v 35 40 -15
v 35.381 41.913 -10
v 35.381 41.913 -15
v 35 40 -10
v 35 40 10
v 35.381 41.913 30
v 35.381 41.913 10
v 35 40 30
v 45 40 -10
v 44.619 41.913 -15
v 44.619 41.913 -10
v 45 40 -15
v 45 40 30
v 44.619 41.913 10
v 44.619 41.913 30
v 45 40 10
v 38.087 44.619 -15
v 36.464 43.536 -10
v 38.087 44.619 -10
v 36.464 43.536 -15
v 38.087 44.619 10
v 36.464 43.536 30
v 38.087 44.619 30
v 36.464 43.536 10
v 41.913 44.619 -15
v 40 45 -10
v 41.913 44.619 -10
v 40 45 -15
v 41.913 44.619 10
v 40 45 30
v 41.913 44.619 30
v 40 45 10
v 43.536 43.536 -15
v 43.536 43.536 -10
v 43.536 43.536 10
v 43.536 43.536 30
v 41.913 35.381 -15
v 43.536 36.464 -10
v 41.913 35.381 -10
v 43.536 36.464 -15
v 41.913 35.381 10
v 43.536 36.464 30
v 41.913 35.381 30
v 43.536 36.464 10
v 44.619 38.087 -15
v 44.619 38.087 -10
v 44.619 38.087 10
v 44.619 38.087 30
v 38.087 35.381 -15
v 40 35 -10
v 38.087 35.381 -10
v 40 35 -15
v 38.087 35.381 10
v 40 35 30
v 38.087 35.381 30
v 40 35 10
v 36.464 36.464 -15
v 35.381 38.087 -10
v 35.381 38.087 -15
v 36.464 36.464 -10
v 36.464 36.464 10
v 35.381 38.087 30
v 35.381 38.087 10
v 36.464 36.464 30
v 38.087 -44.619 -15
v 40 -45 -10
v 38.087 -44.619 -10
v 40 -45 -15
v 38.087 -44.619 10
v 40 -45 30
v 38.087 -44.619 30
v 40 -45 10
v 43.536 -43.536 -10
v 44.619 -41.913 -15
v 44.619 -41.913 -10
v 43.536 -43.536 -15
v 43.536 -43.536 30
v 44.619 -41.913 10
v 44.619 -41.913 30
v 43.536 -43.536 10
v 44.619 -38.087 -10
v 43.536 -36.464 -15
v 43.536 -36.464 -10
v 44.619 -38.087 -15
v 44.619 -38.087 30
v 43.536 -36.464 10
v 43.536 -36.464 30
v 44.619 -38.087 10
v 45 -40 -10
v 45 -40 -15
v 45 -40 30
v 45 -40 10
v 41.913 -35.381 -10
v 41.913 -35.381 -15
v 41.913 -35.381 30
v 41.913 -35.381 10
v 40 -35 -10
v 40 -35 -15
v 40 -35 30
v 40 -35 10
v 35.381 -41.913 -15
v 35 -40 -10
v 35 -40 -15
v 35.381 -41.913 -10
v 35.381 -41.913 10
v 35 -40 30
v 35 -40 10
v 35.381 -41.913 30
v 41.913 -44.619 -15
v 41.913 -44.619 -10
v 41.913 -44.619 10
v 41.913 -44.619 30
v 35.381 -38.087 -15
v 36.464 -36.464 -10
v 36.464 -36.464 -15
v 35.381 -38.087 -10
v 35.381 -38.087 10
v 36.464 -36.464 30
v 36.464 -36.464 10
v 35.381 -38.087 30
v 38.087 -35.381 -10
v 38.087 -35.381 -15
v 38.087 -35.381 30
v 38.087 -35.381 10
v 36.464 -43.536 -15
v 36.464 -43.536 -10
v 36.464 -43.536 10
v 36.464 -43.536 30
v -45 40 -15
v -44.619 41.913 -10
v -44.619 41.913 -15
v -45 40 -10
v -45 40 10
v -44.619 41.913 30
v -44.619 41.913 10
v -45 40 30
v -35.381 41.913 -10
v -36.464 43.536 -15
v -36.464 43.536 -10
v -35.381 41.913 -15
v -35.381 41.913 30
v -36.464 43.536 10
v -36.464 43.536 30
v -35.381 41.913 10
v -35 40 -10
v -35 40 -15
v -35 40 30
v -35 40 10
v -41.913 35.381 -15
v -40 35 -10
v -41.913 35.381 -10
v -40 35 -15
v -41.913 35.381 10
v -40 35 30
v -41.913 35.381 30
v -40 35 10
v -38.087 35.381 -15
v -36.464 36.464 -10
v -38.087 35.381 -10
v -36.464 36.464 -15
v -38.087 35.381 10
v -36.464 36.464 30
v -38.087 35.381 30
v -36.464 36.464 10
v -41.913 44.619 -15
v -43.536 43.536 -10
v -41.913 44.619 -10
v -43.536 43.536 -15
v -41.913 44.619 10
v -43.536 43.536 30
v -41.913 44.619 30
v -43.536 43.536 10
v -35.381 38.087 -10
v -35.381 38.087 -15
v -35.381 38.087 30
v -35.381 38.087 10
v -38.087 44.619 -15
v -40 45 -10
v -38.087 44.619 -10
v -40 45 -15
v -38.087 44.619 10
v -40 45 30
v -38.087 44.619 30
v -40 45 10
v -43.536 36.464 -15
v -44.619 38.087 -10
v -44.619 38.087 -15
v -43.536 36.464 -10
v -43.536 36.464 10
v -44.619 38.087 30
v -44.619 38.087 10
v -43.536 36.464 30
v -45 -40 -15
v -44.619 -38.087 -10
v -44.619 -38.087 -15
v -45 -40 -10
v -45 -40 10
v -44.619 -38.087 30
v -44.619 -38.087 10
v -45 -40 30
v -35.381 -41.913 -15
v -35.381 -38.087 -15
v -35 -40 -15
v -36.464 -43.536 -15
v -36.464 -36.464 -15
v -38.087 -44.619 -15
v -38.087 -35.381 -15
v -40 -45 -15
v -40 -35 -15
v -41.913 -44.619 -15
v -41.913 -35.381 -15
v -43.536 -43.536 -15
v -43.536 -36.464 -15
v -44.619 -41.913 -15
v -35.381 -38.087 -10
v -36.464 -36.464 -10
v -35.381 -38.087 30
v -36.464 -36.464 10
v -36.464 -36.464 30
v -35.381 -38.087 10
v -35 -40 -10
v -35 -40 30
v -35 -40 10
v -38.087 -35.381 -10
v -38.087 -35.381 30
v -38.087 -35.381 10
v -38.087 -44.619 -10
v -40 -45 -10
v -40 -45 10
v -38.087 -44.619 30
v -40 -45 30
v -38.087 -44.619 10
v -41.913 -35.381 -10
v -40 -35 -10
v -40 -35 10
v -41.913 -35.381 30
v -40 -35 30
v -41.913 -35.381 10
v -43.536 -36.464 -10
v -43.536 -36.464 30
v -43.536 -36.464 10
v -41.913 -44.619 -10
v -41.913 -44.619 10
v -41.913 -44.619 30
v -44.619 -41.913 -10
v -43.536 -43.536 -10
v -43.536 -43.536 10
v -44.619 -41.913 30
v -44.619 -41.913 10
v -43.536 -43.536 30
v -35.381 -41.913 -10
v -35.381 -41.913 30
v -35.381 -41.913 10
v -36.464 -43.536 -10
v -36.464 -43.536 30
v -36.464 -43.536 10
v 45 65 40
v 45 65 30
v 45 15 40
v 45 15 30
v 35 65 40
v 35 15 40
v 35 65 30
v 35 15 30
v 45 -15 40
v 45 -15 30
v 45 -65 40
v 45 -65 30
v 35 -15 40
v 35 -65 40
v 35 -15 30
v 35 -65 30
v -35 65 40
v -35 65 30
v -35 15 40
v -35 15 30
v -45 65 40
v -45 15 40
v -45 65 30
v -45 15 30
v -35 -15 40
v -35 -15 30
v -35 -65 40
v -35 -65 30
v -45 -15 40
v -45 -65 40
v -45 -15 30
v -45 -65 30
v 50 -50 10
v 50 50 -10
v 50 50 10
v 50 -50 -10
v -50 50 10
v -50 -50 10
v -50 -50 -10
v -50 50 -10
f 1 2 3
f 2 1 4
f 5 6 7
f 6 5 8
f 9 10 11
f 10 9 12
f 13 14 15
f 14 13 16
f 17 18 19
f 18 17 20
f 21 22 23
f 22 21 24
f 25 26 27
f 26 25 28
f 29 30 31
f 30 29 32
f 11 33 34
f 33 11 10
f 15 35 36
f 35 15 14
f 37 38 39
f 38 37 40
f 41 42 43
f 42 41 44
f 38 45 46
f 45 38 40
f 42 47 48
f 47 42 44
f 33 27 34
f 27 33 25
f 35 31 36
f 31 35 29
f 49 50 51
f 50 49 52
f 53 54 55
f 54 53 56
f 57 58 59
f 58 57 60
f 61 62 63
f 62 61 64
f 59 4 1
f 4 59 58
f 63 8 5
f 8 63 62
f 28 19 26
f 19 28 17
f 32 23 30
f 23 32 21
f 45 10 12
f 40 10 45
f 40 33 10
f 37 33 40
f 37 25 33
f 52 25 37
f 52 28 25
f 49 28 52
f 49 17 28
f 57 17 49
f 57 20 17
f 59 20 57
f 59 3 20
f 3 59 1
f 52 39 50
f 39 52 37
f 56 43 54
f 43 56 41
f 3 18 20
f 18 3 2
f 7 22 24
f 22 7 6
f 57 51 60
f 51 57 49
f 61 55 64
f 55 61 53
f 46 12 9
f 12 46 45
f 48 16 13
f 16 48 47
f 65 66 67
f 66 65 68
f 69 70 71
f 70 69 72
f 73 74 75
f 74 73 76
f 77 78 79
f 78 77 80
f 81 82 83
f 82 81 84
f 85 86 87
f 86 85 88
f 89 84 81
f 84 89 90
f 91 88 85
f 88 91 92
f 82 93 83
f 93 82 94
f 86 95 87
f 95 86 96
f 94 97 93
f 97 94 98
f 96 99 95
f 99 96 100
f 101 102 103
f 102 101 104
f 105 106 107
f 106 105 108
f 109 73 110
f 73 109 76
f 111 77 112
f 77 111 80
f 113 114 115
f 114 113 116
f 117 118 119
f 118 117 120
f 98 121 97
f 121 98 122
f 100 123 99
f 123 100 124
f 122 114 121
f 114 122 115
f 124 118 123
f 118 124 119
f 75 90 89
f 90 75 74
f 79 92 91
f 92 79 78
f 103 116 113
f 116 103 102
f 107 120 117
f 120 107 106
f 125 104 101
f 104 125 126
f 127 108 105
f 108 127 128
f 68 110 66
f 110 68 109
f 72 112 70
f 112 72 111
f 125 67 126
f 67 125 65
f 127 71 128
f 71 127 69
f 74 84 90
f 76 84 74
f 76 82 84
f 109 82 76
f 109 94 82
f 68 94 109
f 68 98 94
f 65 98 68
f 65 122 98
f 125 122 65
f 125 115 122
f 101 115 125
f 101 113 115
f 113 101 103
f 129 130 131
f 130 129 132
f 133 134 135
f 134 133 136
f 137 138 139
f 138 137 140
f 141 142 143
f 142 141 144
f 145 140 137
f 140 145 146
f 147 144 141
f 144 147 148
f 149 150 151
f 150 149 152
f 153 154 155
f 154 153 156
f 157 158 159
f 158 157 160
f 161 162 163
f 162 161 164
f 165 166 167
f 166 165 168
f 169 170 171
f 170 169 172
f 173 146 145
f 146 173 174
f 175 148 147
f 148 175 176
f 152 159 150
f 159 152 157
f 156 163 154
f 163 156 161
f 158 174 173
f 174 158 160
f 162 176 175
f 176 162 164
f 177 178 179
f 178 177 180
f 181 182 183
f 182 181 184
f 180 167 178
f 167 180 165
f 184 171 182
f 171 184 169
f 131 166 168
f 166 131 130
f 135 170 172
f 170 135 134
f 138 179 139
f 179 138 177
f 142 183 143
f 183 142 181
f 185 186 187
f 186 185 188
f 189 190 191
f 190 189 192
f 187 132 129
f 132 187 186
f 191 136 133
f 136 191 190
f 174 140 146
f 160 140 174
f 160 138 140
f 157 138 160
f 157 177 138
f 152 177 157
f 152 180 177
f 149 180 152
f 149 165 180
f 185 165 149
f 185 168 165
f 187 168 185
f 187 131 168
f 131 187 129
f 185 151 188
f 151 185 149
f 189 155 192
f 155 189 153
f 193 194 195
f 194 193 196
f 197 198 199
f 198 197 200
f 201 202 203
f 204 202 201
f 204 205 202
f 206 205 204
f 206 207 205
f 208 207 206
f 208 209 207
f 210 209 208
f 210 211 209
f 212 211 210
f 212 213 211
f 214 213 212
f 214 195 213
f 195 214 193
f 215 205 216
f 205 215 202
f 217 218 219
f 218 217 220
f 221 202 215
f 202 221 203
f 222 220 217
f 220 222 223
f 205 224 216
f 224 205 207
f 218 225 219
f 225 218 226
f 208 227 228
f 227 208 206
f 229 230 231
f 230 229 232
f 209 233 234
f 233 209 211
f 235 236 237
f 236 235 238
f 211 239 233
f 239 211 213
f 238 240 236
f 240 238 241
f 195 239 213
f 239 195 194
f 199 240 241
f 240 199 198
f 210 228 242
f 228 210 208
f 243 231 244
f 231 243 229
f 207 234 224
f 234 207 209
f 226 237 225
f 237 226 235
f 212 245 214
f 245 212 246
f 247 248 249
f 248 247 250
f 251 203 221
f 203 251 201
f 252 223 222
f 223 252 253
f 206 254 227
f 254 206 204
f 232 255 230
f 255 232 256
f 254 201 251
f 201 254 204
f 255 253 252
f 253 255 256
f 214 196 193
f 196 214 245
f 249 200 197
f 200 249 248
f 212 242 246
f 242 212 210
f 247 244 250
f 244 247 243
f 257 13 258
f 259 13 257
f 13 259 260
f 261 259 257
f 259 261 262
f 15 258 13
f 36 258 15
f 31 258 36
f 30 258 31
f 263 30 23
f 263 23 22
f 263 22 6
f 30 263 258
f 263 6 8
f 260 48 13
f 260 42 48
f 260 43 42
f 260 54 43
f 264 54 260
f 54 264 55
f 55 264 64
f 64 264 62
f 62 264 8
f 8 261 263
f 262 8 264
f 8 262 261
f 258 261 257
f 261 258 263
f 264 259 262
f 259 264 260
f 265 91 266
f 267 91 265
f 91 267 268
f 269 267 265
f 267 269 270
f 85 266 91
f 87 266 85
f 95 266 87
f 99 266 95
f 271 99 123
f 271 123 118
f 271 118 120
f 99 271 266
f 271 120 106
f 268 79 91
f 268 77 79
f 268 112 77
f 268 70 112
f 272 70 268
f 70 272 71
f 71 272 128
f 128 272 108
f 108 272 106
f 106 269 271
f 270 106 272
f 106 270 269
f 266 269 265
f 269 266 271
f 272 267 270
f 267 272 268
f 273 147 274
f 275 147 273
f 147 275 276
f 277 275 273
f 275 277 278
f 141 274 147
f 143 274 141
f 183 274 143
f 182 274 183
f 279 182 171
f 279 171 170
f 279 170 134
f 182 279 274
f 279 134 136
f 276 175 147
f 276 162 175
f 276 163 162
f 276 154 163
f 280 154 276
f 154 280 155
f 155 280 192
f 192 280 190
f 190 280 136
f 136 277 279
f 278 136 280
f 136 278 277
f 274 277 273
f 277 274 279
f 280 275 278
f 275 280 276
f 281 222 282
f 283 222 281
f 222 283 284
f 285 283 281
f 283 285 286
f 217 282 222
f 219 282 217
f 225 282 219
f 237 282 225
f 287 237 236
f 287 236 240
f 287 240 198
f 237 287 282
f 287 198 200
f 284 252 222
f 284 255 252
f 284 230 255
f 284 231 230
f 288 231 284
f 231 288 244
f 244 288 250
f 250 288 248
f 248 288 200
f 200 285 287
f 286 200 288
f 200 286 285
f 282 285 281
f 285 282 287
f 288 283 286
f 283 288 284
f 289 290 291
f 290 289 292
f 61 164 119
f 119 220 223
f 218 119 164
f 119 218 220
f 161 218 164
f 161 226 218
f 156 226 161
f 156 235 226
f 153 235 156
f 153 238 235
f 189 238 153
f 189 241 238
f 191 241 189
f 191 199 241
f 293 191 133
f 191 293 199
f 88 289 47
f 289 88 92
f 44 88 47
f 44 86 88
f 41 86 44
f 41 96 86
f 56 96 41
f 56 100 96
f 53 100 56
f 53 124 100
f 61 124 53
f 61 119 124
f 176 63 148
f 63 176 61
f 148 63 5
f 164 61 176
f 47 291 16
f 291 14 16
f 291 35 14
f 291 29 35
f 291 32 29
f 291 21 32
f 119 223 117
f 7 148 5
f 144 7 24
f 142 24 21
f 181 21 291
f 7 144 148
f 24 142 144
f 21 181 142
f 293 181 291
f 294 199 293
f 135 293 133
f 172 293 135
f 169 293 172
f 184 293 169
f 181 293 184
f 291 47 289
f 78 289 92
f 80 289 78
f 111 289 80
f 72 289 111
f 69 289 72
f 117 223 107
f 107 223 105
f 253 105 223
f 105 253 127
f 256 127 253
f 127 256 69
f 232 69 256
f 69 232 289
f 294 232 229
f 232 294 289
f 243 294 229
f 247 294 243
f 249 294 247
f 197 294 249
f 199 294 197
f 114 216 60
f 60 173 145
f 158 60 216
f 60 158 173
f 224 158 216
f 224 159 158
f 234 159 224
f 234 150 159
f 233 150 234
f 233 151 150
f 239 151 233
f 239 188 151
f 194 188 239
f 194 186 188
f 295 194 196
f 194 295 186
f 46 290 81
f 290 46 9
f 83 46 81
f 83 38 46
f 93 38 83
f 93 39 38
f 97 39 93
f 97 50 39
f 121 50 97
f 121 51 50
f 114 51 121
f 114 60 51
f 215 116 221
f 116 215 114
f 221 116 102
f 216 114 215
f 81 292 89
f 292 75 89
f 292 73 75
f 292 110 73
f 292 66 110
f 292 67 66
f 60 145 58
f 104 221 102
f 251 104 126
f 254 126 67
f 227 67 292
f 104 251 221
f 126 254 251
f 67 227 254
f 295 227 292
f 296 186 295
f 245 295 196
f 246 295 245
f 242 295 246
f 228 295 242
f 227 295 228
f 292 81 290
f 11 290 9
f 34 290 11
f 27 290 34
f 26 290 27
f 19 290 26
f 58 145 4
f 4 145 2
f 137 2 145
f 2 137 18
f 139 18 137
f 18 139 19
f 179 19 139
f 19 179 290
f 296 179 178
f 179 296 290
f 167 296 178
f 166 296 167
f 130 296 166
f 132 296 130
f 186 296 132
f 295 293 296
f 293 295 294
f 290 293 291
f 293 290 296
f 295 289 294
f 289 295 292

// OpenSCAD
// Auto-generated Code Vault for 'RobotStructure' [Openscad]

module RobotStructure(baseWidth, baseDepth, baseHeight, pillarHeight, armLength, armWidth, armHeight) {
    // Base of the robot
    module base() {
        cube([baseWidth, baseDepth, baseHeight], center = true);
    }

    // Pillars of the robot
    module pillars() {
        translate([baseWidth/2 - 10, baseDepth/2 - 10, baseHeight/2])
            cylinder(h = pillarHeight, r = 5, center = true);
        translate([baseWidth/2 - 10, -baseDepth/2 + 10, baseHeight/2])
            cylinder(h = pillarHeight, r = 5, center = true);
        translate([-baseWidth/2 + 10, baseDepth/2 - 10, baseHeight/2])
            cylinder(h = pillarHeight, r = 5, center = true);
        translate([-baseWidth/2 + 10, -baseDepth/2 + 10, baseHeight/2])
            cylinder(h = pillarHeight, r = 5, center = true);
    }

    // Arms of the robot
    module arms() {
        translate([baseWidth/2 - 10, baseDepth/2 - 10, baseHeight/2 + pillarHeight/2])
            cube([armWidth, armLength, armHeight], center = true);
        translate([baseWidth/2 - 10, -baseDepth/2 + 10, baseHeight/2 + pillarHeight/2])
            cube([armWidth, armLength, armHeight], center = true);
        translate([-baseWidth/2 + 10, baseDepth/2 - 10, baseHeight/2 + pillarHeight/2])
            cube([armWidth, armLength, armHeight], center = true);
        translate([-baseWidth/2 + 10, -baseDepth/2 + 10, baseHeight/2 + pillarHeight/2])
            cube([armWidth, armLength, armHeight], center = true);
    }

    // Assemble the robot structure
    base();
    pillars();
    arms();
}

// Example usage
RobotStructure(100, 100, 20, 50, 50, 10, 10);
